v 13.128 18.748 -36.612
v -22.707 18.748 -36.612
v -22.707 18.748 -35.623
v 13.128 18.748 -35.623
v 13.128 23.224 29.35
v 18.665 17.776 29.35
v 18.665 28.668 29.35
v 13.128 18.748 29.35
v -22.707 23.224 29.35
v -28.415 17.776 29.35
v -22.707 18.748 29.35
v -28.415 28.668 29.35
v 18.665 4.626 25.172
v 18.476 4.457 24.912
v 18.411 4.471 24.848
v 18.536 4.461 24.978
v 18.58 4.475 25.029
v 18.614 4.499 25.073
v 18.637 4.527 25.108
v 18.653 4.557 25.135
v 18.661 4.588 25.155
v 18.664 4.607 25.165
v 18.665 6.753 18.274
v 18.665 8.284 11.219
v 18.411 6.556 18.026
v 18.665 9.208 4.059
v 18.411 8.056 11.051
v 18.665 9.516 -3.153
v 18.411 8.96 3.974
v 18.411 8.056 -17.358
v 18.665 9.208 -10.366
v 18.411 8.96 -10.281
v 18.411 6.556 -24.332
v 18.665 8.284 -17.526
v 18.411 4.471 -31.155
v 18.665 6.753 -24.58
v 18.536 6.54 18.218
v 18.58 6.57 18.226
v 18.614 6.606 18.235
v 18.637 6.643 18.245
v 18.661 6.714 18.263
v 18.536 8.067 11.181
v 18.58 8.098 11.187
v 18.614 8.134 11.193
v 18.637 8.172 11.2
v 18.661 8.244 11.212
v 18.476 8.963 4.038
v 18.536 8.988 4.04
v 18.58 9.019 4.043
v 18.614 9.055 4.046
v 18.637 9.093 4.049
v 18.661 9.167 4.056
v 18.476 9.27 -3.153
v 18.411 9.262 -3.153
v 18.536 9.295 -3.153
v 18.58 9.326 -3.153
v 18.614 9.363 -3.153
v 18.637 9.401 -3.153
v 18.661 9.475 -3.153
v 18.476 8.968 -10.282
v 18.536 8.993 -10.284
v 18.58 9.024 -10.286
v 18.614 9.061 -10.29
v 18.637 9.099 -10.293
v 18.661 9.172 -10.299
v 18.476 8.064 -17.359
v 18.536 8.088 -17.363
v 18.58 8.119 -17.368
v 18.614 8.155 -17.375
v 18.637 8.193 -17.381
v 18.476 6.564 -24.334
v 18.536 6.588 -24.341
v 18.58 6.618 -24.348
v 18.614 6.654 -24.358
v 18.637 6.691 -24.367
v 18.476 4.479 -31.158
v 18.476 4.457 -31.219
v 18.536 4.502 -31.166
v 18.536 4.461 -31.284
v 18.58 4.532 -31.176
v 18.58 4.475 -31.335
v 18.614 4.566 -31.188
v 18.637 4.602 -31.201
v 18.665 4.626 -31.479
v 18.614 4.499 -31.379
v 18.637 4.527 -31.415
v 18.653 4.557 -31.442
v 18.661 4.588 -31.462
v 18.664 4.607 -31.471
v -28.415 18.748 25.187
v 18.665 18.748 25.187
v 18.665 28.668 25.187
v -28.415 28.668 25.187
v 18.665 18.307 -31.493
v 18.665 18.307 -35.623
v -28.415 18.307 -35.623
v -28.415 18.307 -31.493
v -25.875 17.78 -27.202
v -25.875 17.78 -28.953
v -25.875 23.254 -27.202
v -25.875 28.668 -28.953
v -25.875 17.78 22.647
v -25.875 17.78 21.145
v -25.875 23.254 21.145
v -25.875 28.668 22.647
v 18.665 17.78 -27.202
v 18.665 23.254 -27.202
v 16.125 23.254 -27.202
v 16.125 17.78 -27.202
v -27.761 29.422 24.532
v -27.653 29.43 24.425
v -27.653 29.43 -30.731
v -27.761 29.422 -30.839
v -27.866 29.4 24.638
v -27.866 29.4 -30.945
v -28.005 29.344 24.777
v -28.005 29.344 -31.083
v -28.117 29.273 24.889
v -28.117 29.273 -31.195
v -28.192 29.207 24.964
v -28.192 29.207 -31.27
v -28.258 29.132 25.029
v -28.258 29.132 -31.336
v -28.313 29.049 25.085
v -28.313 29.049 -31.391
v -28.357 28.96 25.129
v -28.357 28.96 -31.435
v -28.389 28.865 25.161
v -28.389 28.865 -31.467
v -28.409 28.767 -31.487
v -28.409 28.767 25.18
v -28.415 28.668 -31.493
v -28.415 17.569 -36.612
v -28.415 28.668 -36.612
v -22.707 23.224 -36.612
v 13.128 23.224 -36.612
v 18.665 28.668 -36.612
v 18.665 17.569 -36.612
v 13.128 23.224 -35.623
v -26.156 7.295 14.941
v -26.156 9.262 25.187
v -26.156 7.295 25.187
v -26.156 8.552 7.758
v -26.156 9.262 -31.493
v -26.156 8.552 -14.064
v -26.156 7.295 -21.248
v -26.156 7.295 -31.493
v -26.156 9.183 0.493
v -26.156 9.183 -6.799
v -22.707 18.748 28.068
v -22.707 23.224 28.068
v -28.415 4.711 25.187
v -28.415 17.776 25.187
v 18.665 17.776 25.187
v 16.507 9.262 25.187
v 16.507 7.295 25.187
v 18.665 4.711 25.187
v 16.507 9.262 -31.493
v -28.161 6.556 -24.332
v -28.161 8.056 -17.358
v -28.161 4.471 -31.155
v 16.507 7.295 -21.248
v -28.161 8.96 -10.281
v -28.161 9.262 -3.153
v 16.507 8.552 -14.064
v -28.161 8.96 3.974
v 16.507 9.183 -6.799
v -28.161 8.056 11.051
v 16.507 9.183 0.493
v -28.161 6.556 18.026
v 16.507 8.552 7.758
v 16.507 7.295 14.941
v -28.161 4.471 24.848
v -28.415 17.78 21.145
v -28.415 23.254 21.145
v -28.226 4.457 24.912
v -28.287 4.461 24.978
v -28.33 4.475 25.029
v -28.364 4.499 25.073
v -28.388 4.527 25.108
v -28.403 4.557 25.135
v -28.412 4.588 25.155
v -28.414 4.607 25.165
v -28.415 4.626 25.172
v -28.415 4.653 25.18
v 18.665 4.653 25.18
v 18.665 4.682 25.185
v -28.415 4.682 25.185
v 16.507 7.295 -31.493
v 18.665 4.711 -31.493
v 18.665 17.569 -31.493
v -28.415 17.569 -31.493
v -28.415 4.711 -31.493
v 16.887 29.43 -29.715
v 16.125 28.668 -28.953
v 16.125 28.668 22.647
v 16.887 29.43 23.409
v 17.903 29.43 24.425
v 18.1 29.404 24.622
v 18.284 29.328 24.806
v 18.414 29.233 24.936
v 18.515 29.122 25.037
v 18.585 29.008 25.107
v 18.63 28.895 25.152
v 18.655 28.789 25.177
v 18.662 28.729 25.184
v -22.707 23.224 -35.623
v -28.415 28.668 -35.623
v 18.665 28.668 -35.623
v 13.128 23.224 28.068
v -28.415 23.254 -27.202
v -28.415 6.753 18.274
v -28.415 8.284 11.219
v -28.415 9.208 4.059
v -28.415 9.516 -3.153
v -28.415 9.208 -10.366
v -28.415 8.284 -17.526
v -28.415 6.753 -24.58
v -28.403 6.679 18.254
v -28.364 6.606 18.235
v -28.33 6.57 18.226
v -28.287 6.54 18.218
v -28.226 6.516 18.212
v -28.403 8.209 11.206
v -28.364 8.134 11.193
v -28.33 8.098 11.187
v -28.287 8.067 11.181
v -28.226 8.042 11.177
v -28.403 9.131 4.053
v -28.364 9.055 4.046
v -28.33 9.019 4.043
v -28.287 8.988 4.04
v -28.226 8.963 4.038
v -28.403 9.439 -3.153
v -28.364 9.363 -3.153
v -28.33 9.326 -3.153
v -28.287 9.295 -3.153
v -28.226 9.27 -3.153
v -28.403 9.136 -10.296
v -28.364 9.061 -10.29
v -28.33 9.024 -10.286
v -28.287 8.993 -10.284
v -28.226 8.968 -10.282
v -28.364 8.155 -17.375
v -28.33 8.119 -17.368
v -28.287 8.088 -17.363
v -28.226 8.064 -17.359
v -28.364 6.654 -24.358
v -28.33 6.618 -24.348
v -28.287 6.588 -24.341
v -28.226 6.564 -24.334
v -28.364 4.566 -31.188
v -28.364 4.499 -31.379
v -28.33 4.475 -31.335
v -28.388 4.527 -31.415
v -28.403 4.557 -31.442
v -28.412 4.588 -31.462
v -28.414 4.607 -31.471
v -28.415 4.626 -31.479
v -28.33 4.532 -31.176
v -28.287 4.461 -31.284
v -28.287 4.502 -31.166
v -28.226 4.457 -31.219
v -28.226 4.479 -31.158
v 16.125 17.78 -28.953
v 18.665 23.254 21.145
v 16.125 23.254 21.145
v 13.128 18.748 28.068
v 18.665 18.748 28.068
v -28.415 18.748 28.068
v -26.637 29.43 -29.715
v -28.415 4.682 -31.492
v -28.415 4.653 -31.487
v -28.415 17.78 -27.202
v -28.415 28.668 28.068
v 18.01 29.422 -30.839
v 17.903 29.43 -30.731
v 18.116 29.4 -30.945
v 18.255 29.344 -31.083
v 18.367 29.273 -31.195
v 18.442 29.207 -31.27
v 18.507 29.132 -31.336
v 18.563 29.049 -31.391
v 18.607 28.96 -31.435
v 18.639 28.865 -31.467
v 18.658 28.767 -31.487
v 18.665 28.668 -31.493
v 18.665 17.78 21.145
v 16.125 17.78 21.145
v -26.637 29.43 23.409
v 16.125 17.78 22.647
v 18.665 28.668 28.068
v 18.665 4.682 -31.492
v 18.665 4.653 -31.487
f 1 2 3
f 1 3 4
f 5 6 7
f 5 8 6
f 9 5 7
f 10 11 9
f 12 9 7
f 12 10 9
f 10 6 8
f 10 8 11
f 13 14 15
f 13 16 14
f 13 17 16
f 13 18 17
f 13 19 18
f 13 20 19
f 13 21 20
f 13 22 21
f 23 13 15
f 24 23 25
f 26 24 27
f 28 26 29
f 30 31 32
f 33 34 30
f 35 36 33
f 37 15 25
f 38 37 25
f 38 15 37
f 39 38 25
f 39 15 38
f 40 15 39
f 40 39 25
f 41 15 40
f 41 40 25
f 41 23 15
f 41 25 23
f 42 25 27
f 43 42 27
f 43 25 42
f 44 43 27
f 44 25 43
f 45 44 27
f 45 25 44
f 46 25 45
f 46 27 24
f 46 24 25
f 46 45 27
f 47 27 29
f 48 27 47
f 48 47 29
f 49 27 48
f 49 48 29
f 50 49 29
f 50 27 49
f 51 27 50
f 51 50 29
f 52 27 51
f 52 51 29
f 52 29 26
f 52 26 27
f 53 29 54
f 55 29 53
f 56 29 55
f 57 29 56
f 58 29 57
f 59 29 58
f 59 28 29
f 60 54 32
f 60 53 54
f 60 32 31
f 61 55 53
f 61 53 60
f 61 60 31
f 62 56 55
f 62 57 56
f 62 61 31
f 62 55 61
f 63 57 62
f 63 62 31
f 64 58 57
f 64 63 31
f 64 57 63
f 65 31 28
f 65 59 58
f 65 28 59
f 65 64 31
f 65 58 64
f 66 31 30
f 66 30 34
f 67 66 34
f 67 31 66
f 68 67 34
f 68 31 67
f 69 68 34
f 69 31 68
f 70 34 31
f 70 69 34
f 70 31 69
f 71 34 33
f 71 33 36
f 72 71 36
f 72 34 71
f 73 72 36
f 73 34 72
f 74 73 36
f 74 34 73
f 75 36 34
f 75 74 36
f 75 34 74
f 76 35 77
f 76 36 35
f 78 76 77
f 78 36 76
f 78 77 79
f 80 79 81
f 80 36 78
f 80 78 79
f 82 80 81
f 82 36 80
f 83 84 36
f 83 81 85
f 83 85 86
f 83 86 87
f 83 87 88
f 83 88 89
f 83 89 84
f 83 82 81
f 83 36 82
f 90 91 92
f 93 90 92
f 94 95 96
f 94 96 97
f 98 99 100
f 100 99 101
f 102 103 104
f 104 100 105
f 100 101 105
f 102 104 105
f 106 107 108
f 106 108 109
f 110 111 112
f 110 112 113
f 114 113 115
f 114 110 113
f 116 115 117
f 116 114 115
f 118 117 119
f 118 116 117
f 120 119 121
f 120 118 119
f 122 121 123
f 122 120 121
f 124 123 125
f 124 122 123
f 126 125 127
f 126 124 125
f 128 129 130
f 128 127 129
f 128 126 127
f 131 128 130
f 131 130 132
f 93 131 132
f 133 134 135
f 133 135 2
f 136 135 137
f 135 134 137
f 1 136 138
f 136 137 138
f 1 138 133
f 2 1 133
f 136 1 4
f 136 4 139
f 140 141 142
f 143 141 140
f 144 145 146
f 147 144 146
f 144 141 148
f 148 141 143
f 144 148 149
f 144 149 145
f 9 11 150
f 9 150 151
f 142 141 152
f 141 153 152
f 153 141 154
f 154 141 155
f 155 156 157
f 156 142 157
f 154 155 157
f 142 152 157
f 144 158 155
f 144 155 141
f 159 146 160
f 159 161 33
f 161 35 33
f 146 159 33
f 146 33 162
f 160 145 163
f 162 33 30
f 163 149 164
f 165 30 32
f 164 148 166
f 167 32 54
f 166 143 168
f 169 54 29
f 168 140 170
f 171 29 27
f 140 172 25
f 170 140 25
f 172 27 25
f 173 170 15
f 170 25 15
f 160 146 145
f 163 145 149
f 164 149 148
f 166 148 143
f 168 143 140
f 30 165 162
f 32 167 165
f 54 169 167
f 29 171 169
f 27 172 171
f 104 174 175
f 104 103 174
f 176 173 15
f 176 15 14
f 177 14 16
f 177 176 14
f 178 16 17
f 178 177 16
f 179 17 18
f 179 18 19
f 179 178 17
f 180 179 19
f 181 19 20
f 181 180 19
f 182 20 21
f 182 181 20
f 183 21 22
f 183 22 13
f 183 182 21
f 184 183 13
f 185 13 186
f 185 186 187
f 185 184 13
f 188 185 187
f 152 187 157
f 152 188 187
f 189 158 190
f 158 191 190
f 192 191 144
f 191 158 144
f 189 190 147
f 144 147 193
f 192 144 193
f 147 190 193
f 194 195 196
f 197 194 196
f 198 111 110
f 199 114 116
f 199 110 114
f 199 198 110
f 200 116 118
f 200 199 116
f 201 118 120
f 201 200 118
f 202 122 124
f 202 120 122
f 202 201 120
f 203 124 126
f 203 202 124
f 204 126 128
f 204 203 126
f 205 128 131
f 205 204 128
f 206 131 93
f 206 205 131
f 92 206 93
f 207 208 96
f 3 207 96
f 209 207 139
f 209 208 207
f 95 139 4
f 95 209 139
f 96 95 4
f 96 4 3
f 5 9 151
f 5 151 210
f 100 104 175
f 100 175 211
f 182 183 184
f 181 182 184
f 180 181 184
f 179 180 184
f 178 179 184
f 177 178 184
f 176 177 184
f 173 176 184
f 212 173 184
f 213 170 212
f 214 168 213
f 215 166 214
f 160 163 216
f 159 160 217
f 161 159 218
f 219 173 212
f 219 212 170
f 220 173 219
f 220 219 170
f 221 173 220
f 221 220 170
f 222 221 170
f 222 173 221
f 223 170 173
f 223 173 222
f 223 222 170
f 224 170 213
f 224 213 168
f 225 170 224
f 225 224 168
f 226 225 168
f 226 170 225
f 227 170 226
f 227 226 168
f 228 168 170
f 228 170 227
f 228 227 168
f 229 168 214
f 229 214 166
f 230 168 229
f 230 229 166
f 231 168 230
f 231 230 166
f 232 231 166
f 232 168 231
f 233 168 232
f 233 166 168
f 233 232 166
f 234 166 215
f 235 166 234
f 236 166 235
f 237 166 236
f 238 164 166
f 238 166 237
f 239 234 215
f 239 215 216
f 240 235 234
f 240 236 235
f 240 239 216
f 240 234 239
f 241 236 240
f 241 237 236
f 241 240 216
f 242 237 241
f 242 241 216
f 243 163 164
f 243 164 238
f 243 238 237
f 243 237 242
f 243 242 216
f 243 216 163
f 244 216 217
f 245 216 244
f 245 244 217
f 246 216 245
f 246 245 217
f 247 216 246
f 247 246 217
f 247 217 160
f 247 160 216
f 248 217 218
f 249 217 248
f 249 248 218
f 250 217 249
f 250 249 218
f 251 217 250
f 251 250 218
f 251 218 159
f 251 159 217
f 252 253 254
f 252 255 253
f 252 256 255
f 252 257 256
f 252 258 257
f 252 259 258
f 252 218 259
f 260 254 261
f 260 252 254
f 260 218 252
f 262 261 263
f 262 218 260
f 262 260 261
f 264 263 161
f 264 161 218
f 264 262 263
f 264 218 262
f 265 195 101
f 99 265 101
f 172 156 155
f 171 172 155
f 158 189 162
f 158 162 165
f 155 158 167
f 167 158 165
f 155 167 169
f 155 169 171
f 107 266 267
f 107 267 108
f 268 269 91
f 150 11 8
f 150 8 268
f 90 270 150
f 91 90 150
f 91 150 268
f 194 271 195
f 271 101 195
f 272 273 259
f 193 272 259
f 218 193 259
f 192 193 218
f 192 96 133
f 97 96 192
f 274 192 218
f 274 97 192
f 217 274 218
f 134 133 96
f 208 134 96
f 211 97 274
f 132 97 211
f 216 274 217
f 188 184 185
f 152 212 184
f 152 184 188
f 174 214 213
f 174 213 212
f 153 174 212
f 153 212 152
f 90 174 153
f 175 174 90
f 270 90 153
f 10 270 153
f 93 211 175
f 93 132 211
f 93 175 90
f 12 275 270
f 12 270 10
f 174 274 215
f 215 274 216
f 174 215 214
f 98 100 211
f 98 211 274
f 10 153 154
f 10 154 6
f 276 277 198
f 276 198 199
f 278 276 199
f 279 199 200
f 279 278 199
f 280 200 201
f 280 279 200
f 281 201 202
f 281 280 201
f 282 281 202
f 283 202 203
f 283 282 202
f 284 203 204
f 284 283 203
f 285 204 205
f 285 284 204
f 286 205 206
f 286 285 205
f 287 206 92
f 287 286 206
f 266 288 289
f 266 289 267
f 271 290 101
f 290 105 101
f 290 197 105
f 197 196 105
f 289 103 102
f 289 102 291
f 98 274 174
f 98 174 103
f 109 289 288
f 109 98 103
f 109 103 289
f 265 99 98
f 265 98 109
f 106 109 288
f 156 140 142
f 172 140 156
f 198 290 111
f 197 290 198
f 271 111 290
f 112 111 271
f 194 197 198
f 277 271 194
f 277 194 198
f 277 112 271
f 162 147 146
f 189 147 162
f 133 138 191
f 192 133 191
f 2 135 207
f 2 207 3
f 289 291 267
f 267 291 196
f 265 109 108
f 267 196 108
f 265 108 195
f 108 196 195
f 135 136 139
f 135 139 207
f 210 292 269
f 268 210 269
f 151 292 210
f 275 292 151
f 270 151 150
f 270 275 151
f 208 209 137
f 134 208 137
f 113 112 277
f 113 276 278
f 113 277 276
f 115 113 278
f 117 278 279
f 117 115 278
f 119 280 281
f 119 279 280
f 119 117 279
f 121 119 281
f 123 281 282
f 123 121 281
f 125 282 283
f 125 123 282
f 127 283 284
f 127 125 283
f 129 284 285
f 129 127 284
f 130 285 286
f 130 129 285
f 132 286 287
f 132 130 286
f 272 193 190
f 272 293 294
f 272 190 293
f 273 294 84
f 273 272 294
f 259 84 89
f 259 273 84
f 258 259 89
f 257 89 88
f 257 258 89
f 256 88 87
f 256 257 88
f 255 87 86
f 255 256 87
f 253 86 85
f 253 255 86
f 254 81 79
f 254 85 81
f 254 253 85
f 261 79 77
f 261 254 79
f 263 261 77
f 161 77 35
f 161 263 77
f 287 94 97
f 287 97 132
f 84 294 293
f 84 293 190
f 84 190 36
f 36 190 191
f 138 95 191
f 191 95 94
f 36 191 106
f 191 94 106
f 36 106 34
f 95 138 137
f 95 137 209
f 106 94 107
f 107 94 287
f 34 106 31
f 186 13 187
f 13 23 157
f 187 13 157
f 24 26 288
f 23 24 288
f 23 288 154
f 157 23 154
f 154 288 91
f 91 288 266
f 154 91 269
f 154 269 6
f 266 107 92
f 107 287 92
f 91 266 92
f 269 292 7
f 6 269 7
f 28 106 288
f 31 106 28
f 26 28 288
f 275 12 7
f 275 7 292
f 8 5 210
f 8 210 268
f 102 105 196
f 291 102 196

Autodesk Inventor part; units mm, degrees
ref_plane "YZ Plane" through (0, 0, 0) normal (1, 0, 0) x (0, 1, 0)
sketch "Sketch1" plane through (0, 0, 0) normal (0, 1, 0) x (-1, 0, 0)
  line L0 (28.4151, 25.1868) -> (-18.6648, 25.1868)
  line L1 (-18.6648, 25.1868) -> (-18.6648, -31.4933)
  line L2 (-18.6648, -31.4933) -> (28.4151, -31.4933)
  line L3 (28.4151, -31.4933) -> (28.4151, 25.1868)
  dimension "d1" = 47.0799
  dimension "d2" = 56.6801
extrude "Extrusion1" add sketch "Sketch1" along normal blind 15.24
sketch "Sketch3" plane through (18.6648, 0, 25.1868) normal (1, 0, 0) x (0, 0, -1)
  line L0 (0, 15.24) -> (56.6801, 15.24) projected
  line L1 (0, 0) -> (0, 15.24) projected
  line L2 (0, 4.3509) -> (0, 0)
  line L3 (0, 0) -> (56.6801, 0) projected
  line L4 (0, 0) -> (56.6801, 0)
  line L5 (56.6801, 0) -> (56.6801, 4.3509)
  line L6 (56.6801, 0) -> (56.6801, 15.24) projected
  arc A0 (56.6801, 4.3509) -> (0, 4.3509) centre (28.3401, -74.9624) ccw
  point P0 (25.1868, 0)
extrude "Extrusion2" cut sketch "Sketch3" against normal through all contours A0 L5 L3 L1
fillet "Fillet1" radius 0.254 4 edges at (18.6648, 9.262, -3.1532) (-4.8752, 4.3509, -31.4933) (-28.4151, 9.262, -3.1532) (-4.8752, 4.3509, 25.1868)
sketch "Sketch4" plane through (0, 15.24, 0) normal (0, 1, 0) x (1, 0, 0)
  point P0 (0, 0)
ref_plane "Work Plane1" through (0, 15.24, 0) normal (0, 1, 0) x (1, 0, 0)
sketch "Sketch8" plane through (0, 15.24, 0) normal (0, 1, 0) x (1, 0, 0)
  line L0 (-28.4151, -25.1868) -> (18.6648, -25.1868) projected
  line L1 (-28.4151, -25.1868) -> (18.6648, -25.1868)
  line L2 (18.6648, -25.1868) -> (18.6648, 31.4933)
  line L3 (18.6648, 31.4933) -> (-28.4151, 31.4933)
  line L4 (-28.4151, 31.4933) -> (-28.4151, -25.1868)
  point P0 (0, 0)
extrude "Extrusion5" add sketch "Sketch8" along normal blind 14.19
sketch "Sketch9" plane through (0, 29.43, 0) normal (0, 1, 0) x (1, 0, 0)
  line L0 (-28.4151, -25.1868) -> (-28.4151, -25.1722) projected
  line L1 (18.6648, 31.4933) -> (18.6648, 31.4787) projected
  line L2 (18.6648, -25.1722) -> (18.6648, -25.1868) projected
  line L3 (-28.4151, 31.4933) -> (18.6648, 31.4933) projected
  line L4 (-25.8751, -22.6468) -> (16.1248, -22.6468)
  line L5 (16.1248, -22.6468) -> (16.1248, 28.9532)
  line L6 (16.1248, 28.9532) -> (-25.8751, 28.9532)
  line L7 (-25.8751, 28.9532) -> (-25.8751, -22.6468)
  line L8 (-25.8751, -22.6468) -> (16.1248, 28.9532) construction
  line L9 (16.1248, -22.6468) -> (-25.8751, 28.9532) construction
  point P0 (0, 0)
  point P1 (-4.8752, 3.1532)
  dimension "d30" = 41.9999
  dimension "d31" = 51.6
extrude "Extrusion6" cut sketch "Sketch9" against normal blind 11.65
fillet "Fillet2" radius 0.762 4 edges at (-28.4151, 29.43, -3.1532) (-4.8752, 29.43, -31.4933) (18.6648, 29.43, -3.1532) (-4.8752, 29.43, 25.1868)
chamfer "Chamfer3" distance 0.762 angle 45 4 edges at (-4.8752, 29.43, 22.6468) (16.1248, 29.43, -3.1532) (-4.8752, 29.43, -28.9532) (-25.8751, 29.43, -3.1532)
sketch "Sketch10" plane through (18.6648, -74.9624, -3.1532) normal (1, 0, 0) x (0, 0, -1)
  arc A0 (28.3255, 79.5882) -> (-28.3255, 79.5882) centre (0, 0) ccw projected
  line L0 (28.34, 79.673) -> (28.34, 103.6304) projected
  line L1 (-28.3255, 79.5882) -> (28.34, 79.5882)
  line L2 (28.34, 79.5882) -> (28.34, 83.3201)
  line L3 (28.34, 83.3201) -> (-28.3255, 83.3201)
  line L4 (-28.3255, 83.3201) -> (-28.3255, 79.5882)
  point P0 (-3.1532, 74.9624)
ref_plane "Work Plane2" through (18.6648, 4.7106, -31.4933) normal (0, 0, -1) x (-1, 0, 0)
sketch "Sketch11" plane through (18.6648, 4.7106, -31.4933) normal (0, 0, -1) x (-1, 0, 0)
  line L0 (0, 4.8055) -> (0, -0.0848) projected
  line L1 (47.0799, -0.0848) -> (47.0799, 4.8055) projected
  line L2 (0, 4.8055) -> (47.0799, 4.8055)
  line L3 (47.0799, 4.8055) -> (47.0799, -0.0848)
  line L4 (47.0799, -0.0848) -> (0, -0.0848)
  line L5 (0, -0.0848) -> (0, 4.8055)
  line L6 (0.254, 4.5515) -> (46.8259, 4.5515) projected
  line L7 (2.1582, 4.5515) -> (44.8203, 4.5515)
  line L8 (44.8203, 4.5515) -> (44.8203, 2.5848)
  line L9 (44.8203, 2.5848) -> (2.1582, 2.5848)
  line L10 (2.1582, 2.5848) -> (2.1582, 4.5515)
  point P0 (18.6648, -4.7106)
extrude "Extrusion7" cut sketch "Sketch11" against normal through all contours L6 L8 L9 L10
sketch "Sketch15" plane through (18.6648, -74.9624, -3.1532) normal (1, 0, 0) x (0, 0, -1)
  line L0 (-25.8, 92.7424) -> (25.8, 92.7424) projected
  line L1 (-24.298, 98.2163) -> (24.0484, 98.2163)
  line L2 (24.0484, 98.2163) -> (24.0484, 92.7424)
  line L3 (24.0484, 92.7424) -> (-24.298, 92.7424)
  line L4 (-24.298, 92.7424) -> (-24.298, 98.2163)
  point P0 (-3.1532, 74.9624)
  point P1 (-24.298, 92.7424)
extrude "Extrusion8" cut sketch "Sketch15" against normal through all
sketch "Sketch16" plane through (-28.4151, -74.9624, -3.1532) normal (-1, 0, 0) x (0, 0, 1)
  line L0 (28.34, 79.673) -> (28.34, 103.6304) projected
  line L1 (28.34, 92.7388) -> (32.5027, 92.7388)
  line L2 (32.5027, 92.7388) -> (32.5027, 103.6304)
  line L3 (32.5027, 103.6304) -> (28.34, 103.6304)
  line L4 (28.34, 103.6304) -> (28.34, 92.7388)
  point P0 (3.1532, 74.9624)
extrude "Extrusion9" add sketch "Sketch16" against normal blind 47.0799
sketch "Sketch17" plane through (-28.4151, -74.9624, -3.1532) normal (-1, 0, 0) x (0, 0, 1)
  line L0 (32.5027, 103.6304) -> (28.34, 103.6304) projected
  line L1 (28.34, 103.6304) -> (31.2211, 103.6304)
  line L2 (31.2211, 103.6304) -> (31.2211, 93.7101)
  line L3 (31.2211, 93.7101) -> (28.34, 93.7101)
  line L4 (28.34, 93.7101) -> (28.34, 103.6304)
  point P0 (3.1532, 74.9624)
  point P1 (31.2211, 103.6304)
extrude "Extrusion10" cut sketch "Sketch17" against normal blind 47.0799
sketch "Sketch18" plane through (18.6648, -74.9624, -3.1532) normal (1, 0, 0) x (0, 0, -1)
  line L0 (28.34, 79.673) -> (28.34, 103.6304) projected
  line L1 (28.34, 103.6304) -> (33.459, 103.6304)
  line L2 (33.459, 103.6304) -> (33.459, 92.5316)
  line L3 (33.459, 92.5316) -> (28.34, 92.5316)
  line L4 (28.34, 92.5316) -> (28.34, 103.6304)
  point P0 (-3.1532, 74.9624)
extrude "Extrusion11" add sketch "Sketch18" against normal blind 47.0799
sketch "Sketch19" plane through (18.6648, -74.9624, -3.1532) normal (1, 0, 0) x (0, 0, -1)
  line L0 (28.34, 103.6304) -> (32.4698, 103.6304)
  line L1 (32.4698, 103.6304) -> (32.4698, 93.2696)
  line L2 (32.4698, 93.2696) -> (28.34, 93.2696)
  line L3 (28.34, 93.2696) -> (28.34, 103.6304)
  point P0 (-3.1532, 74.9624)
extrude "Extrusion12" cut sketch "Sketch19" against normal blind 47.0799
sketch "Sketch20" plane through (18.6648, 17.5691, -36.6123) normal (0, 0, -1) x (-1, 0, 0)
  line L0 (47.0799, 1.1785) -> (0, 1.1785) projected
  line L1 (5.5367, 5.6549) -> (41.372, 5.6549)
  line L2 (41.372, 5.6549) -> (41.372, 1.1785)
  line L3 (41.372, 1.1785) -> (5.5367, 1.1785)
  line L4 (5.5367, 1.1785) -> (5.5367, 5.6549)
  point P0 (18.6648, -17.5691)
  point P1 (5.5367, 1.1785)
extrude "Extrusion13" cut sketch "Sketch20" against normal blind 1.778
sketch "Sketch21" plane through (-28.4151, 17.7764, 29.3495) normal (0, 0, 1) x (1, 0, 0)
  line L0 (5.7079, 0.9713) -> (5.7079, 5.4477) projected
  line L1 (41.5432, 0.9713) -> (5.7079, 0.9713) projected
  line L2 (5.7079, 5.4477) -> (41.5432, 5.4477)
  line L3 (41.5432, 5.4477) -> (41.5432, 0.9713)
  line L4 (41.5432, 0.9713) -> (5.7079, 0.9713)
  line L5 (5.7079, 0.9713) -> (5.7079, 5.4477)
  point P0 (28.4151, -17.7764)
extrude "Extrusion14" cut sketch "Sketch21" against normal blind 1.778
properties part number "wear1"
